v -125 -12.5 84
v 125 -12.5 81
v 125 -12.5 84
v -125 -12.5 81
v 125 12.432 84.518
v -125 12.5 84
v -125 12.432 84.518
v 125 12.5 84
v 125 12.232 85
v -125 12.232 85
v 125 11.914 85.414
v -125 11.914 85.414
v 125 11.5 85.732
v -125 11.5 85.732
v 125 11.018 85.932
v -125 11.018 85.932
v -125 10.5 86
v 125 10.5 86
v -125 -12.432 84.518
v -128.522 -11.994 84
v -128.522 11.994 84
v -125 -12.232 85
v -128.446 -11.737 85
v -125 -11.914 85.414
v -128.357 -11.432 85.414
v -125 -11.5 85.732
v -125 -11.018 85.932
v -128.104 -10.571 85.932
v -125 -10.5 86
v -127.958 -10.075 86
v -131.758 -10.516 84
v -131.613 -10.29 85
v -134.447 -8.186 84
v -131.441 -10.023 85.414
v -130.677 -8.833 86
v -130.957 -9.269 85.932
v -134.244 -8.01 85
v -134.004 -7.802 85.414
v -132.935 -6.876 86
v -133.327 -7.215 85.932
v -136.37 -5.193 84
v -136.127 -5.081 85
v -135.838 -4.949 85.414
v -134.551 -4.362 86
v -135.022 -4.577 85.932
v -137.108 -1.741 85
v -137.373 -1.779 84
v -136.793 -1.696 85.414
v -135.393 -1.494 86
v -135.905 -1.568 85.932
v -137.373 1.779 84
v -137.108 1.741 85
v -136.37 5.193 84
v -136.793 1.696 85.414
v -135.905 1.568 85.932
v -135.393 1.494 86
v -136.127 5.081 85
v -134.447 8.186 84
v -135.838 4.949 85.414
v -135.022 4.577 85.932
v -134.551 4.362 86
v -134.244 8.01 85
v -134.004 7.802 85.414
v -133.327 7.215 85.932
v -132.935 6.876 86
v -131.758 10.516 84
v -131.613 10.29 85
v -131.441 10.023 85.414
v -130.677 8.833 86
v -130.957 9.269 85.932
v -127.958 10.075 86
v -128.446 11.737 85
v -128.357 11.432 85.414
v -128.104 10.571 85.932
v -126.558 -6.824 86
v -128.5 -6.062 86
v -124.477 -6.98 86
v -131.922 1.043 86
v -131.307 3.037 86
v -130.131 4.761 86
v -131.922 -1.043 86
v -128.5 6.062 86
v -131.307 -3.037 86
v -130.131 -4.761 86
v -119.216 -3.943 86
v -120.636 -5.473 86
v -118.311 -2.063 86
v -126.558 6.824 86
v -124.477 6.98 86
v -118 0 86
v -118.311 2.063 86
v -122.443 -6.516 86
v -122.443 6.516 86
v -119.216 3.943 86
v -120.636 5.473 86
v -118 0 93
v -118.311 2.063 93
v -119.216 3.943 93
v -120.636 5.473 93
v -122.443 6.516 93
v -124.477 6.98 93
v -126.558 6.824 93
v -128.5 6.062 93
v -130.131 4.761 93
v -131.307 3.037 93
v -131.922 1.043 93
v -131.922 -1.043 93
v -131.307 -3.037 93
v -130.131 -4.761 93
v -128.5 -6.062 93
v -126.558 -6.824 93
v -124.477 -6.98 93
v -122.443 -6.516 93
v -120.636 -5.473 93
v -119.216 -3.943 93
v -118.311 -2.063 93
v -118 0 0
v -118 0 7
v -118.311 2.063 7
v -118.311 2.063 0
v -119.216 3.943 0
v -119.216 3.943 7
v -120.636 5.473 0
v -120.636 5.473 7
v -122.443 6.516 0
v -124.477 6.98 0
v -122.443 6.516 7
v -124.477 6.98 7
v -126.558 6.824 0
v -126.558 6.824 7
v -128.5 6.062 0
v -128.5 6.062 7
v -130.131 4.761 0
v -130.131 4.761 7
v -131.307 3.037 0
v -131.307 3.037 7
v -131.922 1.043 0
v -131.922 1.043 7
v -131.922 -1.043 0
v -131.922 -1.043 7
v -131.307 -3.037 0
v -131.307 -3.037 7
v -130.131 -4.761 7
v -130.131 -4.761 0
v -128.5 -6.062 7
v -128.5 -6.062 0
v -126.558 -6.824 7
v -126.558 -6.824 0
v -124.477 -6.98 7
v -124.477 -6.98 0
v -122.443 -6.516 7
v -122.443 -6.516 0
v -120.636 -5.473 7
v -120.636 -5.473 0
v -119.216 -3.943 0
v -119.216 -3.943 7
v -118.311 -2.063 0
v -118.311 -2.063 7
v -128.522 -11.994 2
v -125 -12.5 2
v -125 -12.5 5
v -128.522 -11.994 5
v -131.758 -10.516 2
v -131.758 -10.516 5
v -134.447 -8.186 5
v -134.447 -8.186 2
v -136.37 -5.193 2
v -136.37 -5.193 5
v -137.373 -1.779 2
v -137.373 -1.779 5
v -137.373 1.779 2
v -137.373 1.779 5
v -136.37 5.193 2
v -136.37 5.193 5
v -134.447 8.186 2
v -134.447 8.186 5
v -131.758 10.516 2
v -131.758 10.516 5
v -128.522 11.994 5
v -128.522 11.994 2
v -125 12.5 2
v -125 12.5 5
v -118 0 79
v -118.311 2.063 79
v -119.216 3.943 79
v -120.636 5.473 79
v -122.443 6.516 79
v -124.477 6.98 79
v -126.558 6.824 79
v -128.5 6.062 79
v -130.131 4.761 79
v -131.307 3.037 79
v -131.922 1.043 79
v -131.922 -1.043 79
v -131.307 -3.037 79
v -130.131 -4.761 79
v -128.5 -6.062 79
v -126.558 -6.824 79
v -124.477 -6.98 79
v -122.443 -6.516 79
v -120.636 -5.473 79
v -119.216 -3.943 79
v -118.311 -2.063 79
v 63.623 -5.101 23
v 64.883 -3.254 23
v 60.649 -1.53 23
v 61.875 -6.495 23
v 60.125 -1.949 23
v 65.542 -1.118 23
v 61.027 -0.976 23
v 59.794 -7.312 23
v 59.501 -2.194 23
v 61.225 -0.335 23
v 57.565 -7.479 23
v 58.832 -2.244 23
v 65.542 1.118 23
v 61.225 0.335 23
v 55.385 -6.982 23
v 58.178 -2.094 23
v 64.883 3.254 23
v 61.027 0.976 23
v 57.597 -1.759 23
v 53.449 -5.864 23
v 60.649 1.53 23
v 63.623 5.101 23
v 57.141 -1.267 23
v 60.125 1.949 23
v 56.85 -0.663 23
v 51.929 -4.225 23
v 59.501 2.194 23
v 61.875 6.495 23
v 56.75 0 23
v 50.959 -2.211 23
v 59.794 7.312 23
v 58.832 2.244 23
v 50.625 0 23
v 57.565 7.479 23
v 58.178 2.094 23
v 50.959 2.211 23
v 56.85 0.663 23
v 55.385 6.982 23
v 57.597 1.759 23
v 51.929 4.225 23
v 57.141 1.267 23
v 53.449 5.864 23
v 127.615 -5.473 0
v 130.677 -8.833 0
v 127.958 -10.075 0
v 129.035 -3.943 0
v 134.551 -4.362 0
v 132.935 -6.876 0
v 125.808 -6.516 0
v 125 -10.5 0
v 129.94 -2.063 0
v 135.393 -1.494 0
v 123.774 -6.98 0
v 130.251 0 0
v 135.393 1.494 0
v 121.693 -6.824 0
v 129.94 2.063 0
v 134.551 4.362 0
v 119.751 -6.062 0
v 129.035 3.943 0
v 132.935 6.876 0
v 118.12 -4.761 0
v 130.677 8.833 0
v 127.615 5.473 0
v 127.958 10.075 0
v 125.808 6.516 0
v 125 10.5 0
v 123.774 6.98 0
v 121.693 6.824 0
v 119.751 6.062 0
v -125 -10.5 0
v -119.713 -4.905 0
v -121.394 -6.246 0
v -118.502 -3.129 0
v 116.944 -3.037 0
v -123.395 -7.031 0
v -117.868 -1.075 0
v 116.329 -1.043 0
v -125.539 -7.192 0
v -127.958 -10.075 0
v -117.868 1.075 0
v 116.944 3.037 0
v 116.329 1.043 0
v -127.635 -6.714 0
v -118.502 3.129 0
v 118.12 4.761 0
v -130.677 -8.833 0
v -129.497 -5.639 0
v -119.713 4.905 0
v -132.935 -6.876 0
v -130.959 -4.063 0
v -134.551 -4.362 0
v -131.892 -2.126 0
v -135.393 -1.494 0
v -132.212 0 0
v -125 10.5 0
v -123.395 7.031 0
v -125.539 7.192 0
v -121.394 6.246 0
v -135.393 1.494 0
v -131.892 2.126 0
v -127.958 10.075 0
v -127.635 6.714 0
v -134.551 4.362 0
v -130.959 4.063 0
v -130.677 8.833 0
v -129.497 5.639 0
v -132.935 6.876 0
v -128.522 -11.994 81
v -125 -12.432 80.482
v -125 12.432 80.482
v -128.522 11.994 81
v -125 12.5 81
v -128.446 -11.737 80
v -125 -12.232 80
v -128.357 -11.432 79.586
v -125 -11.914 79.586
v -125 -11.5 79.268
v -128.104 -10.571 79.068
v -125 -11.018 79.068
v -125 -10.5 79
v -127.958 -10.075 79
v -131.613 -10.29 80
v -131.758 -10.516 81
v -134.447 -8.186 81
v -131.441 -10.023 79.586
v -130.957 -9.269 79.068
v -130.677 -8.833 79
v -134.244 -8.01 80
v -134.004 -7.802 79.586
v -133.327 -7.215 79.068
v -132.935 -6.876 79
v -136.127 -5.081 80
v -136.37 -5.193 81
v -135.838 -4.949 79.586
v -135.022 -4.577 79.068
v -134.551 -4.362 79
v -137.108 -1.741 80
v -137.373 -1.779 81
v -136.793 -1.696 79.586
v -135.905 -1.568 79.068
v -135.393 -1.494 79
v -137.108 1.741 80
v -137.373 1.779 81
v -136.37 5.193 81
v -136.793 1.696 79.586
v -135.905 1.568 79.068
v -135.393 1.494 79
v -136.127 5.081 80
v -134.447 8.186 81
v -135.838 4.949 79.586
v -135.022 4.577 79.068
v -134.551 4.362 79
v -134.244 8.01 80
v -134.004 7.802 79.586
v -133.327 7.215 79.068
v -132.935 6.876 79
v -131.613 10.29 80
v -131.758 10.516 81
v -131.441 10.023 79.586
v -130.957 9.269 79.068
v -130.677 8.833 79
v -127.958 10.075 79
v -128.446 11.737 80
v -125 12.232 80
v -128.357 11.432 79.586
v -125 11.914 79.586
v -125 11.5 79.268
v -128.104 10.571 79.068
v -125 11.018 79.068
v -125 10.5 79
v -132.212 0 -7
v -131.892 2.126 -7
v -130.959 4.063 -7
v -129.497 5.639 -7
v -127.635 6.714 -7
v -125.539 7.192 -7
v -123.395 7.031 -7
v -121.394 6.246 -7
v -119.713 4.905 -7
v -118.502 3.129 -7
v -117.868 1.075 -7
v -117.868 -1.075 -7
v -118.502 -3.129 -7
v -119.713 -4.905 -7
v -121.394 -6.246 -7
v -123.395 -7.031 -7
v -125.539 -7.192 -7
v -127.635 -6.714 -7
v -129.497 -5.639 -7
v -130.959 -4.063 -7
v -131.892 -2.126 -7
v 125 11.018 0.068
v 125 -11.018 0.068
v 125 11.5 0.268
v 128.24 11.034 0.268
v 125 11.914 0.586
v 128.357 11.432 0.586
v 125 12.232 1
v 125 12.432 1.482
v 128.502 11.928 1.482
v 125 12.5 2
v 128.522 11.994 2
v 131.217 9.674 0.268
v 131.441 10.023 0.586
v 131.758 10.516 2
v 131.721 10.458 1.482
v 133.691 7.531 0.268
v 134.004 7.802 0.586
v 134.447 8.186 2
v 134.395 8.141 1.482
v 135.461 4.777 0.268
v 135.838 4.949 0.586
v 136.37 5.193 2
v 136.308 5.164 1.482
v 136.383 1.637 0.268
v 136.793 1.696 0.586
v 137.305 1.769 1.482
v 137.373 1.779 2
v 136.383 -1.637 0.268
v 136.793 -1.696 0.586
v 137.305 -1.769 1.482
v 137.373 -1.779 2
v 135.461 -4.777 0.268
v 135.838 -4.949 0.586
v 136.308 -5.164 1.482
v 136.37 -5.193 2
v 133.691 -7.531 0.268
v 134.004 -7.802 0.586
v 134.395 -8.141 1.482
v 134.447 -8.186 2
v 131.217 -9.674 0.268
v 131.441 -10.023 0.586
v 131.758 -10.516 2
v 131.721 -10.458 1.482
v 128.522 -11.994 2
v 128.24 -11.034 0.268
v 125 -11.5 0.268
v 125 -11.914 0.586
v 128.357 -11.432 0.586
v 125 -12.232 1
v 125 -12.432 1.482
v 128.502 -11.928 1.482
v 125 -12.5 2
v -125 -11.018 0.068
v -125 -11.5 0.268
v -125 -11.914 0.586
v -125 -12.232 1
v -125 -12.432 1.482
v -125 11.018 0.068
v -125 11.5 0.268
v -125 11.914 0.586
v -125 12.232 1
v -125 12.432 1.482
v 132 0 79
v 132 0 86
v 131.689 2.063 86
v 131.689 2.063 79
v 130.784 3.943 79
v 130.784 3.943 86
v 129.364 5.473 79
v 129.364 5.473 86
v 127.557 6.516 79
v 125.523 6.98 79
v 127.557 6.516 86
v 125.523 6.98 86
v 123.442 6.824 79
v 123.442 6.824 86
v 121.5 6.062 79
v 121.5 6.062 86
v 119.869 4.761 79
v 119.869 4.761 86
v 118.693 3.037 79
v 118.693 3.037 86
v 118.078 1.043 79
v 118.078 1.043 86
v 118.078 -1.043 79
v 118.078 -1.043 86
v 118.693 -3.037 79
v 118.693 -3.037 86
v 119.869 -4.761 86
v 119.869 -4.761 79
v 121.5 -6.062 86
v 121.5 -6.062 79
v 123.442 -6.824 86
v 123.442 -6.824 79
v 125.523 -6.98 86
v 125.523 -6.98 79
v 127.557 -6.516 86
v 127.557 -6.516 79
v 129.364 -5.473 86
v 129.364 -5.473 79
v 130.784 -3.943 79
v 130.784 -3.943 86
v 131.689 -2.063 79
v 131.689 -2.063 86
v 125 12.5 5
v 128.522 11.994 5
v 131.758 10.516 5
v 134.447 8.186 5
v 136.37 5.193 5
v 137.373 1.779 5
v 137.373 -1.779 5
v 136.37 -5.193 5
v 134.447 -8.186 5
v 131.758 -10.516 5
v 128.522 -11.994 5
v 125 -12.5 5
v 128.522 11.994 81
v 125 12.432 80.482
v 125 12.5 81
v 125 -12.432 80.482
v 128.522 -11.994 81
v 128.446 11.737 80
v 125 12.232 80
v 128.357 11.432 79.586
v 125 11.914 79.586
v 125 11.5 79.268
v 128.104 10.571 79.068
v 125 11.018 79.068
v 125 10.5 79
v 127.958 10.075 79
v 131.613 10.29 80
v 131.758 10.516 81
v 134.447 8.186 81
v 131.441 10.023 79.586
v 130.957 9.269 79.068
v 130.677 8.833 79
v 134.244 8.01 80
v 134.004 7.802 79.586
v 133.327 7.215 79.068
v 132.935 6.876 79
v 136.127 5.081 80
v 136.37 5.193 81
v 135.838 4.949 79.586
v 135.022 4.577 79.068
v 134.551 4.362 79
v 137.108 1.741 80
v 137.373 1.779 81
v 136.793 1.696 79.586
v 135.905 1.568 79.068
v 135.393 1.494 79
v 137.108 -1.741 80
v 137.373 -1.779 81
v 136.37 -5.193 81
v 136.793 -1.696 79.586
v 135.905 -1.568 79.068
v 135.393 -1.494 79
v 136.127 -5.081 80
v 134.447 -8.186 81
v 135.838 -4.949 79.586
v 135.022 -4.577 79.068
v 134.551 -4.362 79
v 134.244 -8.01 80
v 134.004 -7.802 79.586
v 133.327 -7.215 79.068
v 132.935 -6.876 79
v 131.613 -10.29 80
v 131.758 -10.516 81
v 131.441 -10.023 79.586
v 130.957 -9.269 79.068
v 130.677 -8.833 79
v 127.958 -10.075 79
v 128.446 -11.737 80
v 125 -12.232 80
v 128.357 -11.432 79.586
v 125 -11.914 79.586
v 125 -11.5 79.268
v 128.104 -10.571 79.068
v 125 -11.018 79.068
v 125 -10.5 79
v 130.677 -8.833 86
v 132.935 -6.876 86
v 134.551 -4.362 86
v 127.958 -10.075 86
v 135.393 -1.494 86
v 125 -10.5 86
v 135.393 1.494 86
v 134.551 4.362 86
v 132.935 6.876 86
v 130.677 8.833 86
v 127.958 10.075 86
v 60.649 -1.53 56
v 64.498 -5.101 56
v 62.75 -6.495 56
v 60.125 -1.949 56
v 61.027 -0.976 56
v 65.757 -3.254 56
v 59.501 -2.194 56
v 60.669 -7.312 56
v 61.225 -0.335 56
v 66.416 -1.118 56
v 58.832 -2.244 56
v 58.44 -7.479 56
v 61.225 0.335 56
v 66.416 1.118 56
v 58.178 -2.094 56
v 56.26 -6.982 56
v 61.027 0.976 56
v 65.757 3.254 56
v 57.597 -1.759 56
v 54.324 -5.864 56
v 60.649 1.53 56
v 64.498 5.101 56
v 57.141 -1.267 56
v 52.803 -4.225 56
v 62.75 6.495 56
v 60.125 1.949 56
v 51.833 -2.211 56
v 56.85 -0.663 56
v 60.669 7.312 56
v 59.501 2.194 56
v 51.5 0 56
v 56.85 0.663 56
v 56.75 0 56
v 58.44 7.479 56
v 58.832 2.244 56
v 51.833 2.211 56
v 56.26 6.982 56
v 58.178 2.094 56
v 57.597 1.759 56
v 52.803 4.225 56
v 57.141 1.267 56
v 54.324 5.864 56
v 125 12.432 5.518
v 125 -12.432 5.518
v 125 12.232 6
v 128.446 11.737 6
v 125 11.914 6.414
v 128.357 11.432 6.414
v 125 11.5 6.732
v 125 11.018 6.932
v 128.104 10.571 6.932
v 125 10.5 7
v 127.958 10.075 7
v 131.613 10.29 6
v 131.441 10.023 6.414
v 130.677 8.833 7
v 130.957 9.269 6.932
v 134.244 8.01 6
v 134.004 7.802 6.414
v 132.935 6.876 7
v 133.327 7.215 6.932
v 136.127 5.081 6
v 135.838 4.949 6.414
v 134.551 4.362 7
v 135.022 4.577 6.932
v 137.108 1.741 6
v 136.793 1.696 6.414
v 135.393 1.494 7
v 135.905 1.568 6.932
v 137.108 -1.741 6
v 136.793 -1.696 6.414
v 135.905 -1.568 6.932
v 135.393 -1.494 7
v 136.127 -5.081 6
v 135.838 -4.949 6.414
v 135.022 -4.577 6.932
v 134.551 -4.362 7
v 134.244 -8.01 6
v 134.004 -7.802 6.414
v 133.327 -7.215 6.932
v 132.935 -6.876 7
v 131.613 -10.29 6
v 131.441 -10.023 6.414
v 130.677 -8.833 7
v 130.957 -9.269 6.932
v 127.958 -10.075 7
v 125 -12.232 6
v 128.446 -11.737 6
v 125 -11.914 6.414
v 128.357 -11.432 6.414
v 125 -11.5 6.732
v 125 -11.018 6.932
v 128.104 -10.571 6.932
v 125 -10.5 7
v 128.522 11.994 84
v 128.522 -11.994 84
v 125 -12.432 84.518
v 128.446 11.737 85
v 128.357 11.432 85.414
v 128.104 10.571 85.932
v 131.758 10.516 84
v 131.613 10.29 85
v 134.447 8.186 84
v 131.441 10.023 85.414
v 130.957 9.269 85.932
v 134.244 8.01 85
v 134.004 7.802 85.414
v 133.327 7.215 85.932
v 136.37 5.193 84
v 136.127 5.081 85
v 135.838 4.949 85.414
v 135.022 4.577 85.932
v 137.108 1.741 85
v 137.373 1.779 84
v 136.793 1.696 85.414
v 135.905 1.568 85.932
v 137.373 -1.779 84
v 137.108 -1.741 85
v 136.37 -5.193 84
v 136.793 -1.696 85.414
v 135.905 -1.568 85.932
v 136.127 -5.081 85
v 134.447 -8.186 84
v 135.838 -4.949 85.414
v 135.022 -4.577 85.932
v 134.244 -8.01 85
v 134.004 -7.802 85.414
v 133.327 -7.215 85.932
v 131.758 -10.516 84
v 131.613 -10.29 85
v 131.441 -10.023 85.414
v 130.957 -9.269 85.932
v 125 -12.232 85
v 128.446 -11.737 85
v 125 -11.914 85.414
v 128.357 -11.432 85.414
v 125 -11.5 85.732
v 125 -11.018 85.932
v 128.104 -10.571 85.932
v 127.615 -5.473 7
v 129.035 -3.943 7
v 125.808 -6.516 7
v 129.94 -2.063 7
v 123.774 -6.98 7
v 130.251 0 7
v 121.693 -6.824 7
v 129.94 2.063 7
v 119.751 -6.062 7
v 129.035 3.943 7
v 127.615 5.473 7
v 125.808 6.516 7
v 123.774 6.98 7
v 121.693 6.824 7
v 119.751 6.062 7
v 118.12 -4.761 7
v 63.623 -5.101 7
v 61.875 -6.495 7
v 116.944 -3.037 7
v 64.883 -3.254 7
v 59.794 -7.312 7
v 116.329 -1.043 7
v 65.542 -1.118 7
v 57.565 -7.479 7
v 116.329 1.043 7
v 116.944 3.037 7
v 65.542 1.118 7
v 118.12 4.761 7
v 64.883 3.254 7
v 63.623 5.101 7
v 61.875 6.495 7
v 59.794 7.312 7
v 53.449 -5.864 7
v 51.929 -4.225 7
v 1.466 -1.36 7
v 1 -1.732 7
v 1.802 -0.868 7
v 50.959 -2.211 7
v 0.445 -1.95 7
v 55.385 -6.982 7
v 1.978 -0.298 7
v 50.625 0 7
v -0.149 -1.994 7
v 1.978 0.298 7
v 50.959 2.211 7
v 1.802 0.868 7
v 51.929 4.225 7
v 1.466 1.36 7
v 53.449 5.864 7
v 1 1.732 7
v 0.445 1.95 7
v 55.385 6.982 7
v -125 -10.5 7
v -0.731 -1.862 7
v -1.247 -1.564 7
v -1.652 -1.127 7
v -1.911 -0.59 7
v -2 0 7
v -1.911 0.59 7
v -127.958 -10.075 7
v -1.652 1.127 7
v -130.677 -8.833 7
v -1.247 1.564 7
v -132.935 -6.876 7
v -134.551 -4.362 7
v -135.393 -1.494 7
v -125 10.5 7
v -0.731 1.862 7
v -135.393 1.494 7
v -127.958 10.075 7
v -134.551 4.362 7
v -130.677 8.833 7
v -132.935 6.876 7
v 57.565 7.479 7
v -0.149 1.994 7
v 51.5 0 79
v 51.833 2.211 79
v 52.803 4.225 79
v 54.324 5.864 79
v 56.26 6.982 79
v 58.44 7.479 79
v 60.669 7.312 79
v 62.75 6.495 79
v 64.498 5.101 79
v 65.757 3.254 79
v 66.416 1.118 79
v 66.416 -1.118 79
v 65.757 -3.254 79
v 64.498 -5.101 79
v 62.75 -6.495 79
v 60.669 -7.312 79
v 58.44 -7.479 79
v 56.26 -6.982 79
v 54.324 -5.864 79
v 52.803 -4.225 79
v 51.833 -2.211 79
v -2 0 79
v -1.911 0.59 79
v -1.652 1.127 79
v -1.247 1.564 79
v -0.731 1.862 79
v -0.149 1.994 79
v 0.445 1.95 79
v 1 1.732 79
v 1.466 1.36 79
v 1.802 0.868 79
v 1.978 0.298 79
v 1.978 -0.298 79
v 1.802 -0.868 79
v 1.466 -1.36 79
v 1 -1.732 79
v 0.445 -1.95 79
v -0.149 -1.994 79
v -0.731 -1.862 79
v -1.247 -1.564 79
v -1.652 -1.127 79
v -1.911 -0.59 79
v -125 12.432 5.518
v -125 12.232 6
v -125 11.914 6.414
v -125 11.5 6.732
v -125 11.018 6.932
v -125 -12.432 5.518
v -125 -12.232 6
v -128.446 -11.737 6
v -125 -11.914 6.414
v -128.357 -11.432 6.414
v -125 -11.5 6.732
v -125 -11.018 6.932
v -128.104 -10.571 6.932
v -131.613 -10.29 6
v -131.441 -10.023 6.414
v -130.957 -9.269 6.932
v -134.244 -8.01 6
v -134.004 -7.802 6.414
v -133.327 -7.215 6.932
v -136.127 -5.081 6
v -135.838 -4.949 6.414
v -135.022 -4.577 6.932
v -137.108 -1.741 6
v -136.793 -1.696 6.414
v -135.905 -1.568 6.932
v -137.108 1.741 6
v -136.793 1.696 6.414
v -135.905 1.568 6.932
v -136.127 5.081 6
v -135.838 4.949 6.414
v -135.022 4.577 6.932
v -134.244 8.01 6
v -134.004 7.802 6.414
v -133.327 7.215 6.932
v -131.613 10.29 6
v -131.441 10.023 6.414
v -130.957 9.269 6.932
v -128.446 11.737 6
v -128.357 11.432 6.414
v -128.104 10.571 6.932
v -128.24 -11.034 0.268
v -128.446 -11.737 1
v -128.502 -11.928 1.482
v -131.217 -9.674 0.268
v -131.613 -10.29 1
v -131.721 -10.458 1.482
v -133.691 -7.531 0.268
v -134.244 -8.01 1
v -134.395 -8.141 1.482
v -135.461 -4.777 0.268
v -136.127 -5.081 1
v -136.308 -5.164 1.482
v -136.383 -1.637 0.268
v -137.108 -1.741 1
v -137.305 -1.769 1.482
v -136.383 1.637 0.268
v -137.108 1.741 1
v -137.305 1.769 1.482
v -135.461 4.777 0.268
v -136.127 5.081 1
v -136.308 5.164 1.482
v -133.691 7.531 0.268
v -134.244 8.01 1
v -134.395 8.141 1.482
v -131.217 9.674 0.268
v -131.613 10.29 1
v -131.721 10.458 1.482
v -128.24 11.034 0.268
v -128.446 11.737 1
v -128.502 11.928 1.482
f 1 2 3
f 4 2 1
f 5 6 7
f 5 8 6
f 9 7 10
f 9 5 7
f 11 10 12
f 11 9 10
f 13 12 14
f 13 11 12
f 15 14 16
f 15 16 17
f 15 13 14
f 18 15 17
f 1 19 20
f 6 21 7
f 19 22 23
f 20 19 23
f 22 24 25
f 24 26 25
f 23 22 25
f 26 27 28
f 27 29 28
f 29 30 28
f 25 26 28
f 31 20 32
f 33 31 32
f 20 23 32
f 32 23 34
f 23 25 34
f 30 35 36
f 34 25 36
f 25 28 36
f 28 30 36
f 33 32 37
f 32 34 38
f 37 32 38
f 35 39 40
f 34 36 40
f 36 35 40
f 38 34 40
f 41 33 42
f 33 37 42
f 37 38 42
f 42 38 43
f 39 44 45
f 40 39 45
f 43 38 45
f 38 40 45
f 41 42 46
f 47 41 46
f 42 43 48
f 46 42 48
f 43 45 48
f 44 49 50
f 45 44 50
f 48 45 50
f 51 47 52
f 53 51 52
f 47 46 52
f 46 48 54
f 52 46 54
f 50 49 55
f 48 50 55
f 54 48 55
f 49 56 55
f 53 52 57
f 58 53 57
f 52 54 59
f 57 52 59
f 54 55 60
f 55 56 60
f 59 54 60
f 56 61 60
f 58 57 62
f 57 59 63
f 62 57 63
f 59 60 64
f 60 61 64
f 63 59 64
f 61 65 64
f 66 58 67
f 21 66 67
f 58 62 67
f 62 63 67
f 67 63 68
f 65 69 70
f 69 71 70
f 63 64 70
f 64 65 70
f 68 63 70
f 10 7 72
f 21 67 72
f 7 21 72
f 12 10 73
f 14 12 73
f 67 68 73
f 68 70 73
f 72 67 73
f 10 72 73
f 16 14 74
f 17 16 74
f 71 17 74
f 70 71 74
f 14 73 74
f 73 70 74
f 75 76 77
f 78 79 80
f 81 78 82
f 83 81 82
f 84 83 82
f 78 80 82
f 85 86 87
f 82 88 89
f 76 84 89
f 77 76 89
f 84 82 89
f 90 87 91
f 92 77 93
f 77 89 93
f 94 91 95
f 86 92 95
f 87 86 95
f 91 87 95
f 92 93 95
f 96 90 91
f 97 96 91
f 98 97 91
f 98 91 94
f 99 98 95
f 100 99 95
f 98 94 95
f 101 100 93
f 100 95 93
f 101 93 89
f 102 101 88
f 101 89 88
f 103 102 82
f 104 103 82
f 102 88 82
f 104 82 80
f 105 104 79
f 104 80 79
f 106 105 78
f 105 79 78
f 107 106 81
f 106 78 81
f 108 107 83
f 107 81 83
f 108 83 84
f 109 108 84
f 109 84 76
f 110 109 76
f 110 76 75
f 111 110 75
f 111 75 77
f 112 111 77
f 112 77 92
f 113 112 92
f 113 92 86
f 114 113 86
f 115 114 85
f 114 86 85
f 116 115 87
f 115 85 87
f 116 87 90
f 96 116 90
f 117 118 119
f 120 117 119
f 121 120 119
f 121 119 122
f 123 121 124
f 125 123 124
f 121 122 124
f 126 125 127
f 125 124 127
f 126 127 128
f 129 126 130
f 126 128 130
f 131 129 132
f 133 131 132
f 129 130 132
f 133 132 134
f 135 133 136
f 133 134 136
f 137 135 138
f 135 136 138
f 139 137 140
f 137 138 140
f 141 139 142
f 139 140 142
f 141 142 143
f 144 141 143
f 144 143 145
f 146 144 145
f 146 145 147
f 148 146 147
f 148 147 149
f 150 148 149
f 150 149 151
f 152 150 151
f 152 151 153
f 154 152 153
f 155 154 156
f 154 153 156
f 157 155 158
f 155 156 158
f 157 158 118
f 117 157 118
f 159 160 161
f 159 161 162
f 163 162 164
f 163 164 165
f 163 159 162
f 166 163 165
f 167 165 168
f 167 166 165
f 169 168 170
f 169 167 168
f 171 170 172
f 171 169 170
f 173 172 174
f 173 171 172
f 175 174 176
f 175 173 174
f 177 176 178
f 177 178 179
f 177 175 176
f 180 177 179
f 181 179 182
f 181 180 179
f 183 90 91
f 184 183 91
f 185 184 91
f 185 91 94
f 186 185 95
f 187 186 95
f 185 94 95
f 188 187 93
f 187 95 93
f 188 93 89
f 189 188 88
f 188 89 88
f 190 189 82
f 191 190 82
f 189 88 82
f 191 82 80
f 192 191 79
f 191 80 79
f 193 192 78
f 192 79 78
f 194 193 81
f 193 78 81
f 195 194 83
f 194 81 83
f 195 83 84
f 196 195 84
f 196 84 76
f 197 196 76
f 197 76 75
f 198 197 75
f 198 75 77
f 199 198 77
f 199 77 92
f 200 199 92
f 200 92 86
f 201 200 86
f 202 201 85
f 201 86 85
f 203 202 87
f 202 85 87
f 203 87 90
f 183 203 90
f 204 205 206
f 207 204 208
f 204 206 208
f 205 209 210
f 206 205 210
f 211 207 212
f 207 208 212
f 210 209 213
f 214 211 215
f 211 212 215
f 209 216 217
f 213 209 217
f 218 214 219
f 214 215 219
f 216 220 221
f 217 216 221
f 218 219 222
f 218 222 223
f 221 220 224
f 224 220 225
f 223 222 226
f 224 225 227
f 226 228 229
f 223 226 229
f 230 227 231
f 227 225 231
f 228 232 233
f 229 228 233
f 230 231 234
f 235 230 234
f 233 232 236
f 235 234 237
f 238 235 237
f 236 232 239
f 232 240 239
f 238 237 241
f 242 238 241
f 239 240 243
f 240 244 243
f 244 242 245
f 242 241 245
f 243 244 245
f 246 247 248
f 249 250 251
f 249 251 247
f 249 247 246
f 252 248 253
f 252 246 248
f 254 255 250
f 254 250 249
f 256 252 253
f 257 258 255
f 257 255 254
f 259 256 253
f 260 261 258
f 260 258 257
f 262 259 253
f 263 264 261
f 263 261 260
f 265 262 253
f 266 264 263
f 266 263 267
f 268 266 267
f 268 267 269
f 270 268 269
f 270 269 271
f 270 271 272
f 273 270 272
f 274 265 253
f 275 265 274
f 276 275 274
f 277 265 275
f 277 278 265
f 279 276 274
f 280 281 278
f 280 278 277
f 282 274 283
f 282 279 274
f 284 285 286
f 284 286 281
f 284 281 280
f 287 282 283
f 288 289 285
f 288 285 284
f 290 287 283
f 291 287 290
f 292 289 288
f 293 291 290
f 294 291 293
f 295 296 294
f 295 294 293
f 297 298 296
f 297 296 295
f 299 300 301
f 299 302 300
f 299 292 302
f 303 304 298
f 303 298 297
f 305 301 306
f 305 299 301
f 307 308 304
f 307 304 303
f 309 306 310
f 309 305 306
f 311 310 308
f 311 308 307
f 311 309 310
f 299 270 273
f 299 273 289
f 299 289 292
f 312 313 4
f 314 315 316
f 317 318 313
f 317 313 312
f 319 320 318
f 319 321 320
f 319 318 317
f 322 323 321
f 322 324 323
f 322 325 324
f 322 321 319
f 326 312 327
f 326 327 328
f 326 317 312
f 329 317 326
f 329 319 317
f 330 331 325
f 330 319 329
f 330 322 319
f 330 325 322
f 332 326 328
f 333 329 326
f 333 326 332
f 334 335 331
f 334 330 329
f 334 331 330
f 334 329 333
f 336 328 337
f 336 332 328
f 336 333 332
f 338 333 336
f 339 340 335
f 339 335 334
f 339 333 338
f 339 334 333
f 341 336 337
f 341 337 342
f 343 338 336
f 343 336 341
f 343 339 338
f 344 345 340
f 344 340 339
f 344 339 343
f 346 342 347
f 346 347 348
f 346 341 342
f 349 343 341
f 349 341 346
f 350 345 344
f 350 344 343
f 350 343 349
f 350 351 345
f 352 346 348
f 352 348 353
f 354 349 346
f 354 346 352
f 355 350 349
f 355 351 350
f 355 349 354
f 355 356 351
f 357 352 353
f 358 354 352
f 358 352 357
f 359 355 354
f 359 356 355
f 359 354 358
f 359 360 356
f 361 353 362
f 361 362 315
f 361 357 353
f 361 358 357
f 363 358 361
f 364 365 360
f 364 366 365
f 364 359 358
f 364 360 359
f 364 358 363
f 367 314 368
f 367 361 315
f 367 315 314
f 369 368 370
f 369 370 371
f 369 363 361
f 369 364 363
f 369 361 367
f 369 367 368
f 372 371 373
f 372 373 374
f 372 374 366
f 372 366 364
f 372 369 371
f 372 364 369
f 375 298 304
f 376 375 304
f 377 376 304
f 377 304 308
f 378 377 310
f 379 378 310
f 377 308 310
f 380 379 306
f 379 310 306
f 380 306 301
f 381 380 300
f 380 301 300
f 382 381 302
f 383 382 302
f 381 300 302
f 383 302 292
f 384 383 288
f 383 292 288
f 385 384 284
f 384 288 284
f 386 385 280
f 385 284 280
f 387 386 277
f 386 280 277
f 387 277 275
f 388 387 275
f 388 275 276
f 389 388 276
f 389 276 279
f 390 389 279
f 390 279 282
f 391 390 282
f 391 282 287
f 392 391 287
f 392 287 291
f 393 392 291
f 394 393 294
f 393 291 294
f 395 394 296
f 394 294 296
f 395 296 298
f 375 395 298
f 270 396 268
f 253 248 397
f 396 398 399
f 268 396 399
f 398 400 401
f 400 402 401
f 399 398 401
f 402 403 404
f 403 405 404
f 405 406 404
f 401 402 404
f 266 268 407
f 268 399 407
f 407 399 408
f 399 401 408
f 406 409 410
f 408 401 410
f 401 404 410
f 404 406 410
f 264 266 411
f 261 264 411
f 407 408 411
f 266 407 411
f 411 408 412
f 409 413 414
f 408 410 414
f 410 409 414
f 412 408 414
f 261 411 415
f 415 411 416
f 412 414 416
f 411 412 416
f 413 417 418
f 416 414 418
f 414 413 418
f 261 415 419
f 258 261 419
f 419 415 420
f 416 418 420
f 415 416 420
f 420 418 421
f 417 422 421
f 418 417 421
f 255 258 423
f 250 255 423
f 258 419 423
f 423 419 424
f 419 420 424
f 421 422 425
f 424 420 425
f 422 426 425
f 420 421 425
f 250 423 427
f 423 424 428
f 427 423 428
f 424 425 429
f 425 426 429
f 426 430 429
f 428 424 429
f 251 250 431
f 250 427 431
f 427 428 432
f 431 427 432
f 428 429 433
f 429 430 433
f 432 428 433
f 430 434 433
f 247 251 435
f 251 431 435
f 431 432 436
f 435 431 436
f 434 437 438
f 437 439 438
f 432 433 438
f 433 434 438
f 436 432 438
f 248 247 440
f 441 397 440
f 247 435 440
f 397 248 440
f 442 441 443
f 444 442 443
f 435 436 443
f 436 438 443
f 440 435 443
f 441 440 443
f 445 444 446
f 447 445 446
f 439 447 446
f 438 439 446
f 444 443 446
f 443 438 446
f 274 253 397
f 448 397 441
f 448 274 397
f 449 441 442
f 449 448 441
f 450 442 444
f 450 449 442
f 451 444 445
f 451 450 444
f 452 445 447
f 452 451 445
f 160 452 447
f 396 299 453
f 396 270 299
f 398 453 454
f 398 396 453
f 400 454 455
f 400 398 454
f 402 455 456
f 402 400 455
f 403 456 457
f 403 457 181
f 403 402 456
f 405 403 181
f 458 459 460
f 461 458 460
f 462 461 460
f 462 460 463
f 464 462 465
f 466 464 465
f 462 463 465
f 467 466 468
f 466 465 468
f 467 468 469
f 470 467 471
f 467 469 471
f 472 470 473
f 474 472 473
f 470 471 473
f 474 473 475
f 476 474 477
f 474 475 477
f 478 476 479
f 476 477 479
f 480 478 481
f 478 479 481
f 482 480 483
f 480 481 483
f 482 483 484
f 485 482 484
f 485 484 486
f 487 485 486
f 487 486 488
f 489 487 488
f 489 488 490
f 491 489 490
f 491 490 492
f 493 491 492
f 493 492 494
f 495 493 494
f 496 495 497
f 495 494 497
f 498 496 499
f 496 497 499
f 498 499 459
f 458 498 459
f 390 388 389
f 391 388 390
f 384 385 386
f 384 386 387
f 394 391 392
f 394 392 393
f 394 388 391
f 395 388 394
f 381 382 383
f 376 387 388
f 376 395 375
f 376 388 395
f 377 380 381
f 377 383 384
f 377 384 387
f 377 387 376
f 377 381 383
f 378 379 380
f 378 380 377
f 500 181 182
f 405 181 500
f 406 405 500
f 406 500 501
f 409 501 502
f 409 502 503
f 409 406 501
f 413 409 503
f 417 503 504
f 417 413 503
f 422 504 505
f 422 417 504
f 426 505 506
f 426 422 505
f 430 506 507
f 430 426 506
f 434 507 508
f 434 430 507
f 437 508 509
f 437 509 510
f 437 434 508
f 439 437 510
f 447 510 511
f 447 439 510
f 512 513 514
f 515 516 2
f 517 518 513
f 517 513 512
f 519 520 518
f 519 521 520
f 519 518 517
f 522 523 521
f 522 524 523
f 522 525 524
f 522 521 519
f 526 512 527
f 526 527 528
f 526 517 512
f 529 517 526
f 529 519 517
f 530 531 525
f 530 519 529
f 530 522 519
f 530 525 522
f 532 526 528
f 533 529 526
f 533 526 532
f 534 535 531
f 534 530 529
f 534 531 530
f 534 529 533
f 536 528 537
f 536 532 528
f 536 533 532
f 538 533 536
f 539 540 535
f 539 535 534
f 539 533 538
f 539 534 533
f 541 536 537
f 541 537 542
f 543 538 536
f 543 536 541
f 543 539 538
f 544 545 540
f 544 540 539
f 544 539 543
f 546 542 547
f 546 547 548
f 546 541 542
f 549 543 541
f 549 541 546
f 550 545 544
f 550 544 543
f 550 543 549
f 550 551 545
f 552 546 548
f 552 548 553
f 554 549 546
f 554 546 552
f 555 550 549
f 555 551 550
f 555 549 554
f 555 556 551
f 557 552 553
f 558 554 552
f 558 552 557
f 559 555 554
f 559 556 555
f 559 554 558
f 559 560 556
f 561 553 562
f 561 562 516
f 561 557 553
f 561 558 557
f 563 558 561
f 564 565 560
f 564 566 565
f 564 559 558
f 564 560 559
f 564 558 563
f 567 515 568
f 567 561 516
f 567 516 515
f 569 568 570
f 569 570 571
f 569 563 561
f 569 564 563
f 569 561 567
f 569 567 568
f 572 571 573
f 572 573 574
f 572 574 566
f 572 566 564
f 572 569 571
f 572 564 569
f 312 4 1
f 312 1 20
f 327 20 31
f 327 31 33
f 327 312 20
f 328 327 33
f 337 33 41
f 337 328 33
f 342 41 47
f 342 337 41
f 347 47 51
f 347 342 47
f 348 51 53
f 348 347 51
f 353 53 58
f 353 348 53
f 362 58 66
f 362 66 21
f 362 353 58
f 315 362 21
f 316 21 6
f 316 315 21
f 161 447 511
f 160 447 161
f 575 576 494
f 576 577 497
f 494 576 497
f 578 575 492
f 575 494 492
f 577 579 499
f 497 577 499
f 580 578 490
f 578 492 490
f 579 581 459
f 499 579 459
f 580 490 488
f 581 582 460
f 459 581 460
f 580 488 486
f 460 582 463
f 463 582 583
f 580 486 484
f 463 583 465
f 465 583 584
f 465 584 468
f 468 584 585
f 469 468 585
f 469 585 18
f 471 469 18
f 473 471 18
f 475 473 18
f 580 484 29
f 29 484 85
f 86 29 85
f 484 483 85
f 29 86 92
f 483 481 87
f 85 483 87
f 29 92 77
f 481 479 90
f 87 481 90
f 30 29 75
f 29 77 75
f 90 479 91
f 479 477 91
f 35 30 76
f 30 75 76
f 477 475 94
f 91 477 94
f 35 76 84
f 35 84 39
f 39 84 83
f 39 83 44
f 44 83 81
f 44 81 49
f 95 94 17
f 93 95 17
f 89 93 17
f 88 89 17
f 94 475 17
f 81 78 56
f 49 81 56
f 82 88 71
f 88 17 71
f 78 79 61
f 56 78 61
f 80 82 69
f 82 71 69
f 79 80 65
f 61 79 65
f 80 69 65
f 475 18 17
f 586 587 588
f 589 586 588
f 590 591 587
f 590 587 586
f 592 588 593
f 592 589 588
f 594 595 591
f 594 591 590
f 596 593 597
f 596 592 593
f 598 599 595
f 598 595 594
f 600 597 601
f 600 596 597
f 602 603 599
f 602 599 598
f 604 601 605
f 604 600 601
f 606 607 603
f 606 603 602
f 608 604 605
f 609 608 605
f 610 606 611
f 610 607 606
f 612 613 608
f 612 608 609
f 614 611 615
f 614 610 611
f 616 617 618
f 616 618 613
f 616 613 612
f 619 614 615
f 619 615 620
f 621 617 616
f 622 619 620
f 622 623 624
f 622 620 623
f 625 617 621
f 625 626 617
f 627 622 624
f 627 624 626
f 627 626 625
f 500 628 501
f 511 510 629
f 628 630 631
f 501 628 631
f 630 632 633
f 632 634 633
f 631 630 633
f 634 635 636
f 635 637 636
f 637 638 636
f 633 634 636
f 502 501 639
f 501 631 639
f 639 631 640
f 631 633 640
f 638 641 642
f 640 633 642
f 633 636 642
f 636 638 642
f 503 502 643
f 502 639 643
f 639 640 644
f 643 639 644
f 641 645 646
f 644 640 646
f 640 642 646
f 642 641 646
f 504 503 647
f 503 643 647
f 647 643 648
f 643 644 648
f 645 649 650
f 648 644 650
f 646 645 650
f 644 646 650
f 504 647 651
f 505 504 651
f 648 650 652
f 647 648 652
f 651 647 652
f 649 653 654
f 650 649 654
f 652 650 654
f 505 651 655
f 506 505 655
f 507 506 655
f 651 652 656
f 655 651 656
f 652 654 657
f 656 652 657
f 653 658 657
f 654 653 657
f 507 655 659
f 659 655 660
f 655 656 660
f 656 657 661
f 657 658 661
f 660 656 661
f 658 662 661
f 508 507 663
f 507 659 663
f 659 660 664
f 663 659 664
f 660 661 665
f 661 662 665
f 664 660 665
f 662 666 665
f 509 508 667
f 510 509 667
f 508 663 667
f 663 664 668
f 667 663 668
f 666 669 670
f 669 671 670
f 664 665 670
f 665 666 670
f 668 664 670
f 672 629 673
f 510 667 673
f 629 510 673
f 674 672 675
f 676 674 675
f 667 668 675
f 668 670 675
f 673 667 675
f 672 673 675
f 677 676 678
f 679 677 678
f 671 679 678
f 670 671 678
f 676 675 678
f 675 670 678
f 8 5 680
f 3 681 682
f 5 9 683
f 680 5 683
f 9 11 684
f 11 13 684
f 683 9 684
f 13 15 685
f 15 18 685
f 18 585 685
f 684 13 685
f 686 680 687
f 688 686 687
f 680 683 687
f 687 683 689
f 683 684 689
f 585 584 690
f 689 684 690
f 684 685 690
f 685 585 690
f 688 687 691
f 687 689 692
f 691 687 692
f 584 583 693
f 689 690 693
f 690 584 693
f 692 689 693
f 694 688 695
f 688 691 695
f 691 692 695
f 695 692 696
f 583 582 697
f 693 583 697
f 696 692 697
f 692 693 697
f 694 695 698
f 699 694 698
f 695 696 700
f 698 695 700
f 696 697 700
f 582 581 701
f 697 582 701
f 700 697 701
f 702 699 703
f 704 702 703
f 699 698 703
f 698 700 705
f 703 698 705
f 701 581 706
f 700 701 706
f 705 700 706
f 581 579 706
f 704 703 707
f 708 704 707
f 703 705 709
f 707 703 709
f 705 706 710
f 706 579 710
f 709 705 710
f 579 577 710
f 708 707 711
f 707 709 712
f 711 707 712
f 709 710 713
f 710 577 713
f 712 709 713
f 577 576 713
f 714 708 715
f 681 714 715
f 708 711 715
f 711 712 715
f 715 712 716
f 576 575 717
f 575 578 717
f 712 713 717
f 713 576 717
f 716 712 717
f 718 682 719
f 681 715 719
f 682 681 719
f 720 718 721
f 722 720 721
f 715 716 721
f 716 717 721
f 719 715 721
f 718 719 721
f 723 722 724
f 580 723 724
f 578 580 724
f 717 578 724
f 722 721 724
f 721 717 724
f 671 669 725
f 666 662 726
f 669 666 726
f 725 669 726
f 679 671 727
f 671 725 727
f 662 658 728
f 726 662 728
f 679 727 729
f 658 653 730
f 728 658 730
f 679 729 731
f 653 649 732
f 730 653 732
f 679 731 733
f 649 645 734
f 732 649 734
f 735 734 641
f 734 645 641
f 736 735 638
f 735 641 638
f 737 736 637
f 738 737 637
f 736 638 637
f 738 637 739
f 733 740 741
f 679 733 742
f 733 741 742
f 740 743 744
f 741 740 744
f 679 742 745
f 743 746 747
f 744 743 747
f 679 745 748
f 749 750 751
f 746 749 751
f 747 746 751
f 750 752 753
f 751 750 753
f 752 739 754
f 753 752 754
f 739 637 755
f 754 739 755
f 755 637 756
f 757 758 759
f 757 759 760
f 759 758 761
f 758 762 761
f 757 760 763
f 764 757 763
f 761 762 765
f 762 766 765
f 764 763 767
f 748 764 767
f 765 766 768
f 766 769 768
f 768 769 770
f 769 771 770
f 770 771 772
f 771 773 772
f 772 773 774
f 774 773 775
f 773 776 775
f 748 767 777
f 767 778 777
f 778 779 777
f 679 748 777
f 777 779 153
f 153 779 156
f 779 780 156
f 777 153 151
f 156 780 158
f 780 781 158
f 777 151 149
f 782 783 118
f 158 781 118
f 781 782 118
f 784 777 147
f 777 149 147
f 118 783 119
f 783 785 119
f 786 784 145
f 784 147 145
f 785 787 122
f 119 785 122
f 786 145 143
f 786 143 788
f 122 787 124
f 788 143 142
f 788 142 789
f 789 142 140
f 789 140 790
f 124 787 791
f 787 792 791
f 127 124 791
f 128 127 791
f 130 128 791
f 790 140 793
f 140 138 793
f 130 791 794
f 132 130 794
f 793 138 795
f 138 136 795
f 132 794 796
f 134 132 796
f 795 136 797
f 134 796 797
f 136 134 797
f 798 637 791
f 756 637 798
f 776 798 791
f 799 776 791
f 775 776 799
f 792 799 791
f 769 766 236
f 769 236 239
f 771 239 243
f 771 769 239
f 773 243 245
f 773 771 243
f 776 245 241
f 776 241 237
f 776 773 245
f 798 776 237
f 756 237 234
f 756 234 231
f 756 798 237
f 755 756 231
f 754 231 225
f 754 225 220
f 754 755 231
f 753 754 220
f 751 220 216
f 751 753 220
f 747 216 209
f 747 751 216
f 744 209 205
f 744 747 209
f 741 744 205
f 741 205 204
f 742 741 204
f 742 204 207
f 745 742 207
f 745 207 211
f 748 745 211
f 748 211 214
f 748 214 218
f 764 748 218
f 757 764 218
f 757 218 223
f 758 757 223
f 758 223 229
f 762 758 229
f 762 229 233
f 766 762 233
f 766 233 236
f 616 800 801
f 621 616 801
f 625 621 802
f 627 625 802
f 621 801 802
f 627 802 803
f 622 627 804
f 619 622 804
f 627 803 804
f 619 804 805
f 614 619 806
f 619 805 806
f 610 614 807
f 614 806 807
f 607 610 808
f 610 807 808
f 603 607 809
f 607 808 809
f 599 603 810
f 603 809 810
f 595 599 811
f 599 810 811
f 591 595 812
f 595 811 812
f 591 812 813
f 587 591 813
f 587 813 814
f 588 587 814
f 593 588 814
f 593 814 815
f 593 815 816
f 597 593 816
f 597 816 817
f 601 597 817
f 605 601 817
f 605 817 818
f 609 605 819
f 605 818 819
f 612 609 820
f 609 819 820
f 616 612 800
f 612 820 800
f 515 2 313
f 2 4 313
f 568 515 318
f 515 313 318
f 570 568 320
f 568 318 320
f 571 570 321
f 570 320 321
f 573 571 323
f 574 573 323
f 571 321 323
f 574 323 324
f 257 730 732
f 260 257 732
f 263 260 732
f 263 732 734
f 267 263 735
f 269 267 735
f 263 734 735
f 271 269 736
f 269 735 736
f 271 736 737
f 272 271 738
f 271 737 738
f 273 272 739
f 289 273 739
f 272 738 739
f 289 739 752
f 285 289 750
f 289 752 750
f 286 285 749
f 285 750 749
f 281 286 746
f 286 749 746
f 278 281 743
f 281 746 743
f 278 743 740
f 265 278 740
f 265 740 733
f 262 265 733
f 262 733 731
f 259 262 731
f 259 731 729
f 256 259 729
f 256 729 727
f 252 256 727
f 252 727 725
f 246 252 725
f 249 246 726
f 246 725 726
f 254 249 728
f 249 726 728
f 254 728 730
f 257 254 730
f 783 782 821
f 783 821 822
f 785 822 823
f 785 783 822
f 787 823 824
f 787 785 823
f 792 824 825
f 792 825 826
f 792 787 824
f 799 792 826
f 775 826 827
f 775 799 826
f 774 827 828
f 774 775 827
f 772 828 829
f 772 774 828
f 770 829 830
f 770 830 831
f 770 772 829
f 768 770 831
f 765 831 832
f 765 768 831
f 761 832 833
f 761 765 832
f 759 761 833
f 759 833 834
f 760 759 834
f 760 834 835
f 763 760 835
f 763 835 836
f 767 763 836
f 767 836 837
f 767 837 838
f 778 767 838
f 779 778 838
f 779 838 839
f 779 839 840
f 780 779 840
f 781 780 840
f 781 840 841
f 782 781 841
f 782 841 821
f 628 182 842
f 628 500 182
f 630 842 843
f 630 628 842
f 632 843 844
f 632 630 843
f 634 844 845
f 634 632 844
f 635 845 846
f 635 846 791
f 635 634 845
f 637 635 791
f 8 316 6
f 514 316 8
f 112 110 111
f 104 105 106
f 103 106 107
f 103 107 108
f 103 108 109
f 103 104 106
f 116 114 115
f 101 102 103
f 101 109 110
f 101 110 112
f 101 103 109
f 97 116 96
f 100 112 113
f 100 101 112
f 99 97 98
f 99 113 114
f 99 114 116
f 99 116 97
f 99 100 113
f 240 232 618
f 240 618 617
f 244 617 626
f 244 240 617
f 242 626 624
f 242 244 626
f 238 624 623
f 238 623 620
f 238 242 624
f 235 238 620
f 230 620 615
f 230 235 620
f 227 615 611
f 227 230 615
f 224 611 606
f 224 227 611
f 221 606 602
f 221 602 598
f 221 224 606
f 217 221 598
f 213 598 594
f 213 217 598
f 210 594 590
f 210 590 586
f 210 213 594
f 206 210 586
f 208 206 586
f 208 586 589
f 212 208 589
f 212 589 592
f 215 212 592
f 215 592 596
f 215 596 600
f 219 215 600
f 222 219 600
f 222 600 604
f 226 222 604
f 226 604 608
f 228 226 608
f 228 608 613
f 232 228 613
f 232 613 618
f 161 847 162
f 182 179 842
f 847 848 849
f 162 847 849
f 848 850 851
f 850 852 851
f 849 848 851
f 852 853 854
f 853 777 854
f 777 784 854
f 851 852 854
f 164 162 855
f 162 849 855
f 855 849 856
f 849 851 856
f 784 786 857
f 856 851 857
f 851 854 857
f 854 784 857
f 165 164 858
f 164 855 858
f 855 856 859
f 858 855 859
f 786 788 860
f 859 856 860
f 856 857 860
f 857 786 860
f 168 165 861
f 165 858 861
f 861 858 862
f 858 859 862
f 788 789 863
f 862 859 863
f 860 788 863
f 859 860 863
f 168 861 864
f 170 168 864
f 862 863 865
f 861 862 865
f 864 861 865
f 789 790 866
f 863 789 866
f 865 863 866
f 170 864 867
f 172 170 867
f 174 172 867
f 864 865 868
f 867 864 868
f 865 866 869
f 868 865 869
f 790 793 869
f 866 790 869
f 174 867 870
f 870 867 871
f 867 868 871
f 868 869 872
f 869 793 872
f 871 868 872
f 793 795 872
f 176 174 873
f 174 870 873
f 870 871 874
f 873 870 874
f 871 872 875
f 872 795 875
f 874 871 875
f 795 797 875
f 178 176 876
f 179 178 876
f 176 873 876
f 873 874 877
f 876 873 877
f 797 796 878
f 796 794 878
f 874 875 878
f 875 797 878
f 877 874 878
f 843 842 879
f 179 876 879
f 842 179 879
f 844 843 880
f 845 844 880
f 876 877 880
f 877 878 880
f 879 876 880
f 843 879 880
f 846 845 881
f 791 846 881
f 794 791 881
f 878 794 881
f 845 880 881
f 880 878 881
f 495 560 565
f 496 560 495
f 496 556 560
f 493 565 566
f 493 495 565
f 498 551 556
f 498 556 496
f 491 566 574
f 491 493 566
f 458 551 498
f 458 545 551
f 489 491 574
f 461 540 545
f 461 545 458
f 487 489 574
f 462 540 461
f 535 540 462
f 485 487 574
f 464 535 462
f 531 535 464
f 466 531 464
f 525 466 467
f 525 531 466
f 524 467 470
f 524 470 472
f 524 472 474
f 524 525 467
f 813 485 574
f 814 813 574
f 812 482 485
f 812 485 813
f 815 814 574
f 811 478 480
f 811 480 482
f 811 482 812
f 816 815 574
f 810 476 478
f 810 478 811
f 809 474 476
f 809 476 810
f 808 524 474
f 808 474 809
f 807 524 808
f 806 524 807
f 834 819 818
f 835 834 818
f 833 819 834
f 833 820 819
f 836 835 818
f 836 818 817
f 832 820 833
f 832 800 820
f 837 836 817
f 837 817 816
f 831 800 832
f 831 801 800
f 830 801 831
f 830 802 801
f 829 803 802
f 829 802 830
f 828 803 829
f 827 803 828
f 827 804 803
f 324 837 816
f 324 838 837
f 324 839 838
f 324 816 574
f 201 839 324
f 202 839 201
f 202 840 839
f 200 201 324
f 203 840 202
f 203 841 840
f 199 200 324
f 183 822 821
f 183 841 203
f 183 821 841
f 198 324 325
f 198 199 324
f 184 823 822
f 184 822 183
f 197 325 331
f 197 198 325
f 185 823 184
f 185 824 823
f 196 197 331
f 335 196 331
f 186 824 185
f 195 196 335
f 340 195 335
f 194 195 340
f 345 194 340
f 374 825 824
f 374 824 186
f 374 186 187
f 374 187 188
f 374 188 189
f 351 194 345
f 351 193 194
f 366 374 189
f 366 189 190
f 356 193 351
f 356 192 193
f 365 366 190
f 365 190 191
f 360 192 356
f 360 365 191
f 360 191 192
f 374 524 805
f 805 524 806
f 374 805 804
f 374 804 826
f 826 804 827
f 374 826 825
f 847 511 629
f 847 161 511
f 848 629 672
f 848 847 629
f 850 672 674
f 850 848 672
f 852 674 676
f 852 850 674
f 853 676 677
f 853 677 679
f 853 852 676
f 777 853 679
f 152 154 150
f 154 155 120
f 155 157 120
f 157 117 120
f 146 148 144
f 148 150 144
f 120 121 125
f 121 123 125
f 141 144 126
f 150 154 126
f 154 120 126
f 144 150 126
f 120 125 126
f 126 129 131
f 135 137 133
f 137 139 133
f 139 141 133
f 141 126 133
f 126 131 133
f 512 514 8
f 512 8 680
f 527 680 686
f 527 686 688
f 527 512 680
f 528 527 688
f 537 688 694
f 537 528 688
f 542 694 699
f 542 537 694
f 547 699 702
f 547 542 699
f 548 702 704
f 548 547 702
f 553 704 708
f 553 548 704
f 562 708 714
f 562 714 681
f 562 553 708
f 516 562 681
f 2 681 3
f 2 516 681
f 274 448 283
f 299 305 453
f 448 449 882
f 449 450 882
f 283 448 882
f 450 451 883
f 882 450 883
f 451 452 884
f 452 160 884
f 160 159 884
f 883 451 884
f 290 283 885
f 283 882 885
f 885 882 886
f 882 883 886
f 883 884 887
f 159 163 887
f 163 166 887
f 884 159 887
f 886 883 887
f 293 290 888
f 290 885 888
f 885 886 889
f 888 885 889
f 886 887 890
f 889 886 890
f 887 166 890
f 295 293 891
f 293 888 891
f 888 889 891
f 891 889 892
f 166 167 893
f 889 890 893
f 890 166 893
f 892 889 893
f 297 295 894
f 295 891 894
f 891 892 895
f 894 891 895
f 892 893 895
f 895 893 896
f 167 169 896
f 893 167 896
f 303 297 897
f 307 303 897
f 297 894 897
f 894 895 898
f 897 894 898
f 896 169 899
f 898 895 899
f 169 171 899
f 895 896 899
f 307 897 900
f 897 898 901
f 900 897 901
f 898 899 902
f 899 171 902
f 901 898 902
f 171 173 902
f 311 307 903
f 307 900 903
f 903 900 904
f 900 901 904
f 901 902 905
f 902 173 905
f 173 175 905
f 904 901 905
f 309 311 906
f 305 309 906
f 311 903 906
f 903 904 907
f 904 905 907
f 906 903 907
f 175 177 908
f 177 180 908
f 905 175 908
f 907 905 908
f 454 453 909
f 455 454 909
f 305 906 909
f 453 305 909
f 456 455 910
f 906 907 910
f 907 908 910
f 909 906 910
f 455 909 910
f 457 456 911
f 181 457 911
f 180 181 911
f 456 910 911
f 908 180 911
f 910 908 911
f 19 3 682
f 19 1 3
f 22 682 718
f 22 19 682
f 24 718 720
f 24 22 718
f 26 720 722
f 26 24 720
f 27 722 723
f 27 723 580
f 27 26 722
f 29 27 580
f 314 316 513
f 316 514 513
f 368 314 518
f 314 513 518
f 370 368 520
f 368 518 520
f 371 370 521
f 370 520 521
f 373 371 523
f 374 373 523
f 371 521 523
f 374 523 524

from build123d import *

# Parameters (mm, degrees)
BOSS_EXTRUDE1_DEPTH = 7
SKETCH2_R           = 7
CUT_EXTRUDE1_DEPTH  = 7
SKETCH3_R           = 7
CUT_EXTRUDE2_DEPTH  = 7
BOSS_EXTRUDE2_DEPTH = 7
SKETCH5_R           = 7
CUT_EXTRUDE3_DEPTH  = 7
SKETCH6_R           = 7
BOSS_EXTRUDE3_DEPTH = 7
SKETCH8_R           = 7.21207686
BOSS_EXTRUDE4_DEPTH = 7
FILLET1_R           = 2
FILLET2_R           = 2
SKETCH9_R           = 2
BOSS_EXTRUDE5_DEPTH = 82
SKETCH10_R          = 2.25
BOSS_EXTRUDE6_DEPTH = 82
SKETCH11_R          = 7.5
BOSS_EXTRUDE7_DEPTH = 23
SKETCH12_R          = 7.5
BOSS_EXTRUDE8_DEPTH = 23


with BuildPart() as part:
    # Sketch1 → Boss-Extrude1 (new body)
    with BuildSketch(Plane.XY):
        with BuildLine():
            Line((-125, 12.5), (125, 12.5))
            ThreePointArc((125, 12.5), (137.5, 0), (125, -12.5))
            Line((125, -12.5), (-125, -12.5))
            ThreePointArc((-125, -12.5), (-137.5, 0), (-125, 12.5))
        make_face()
    extrude(amount=BOSS_EXTRUDE1_DEPTH)

    # Sketch2 → Cut-Extrude1 (cut)
    with BuildSketch(Plane.XY.offset(7)):
        with Locations((-125, 0)):
            Circle(SKETCH2_R)
    extrude(amount=-CUT_EXTRUDE1_DEPTH, mode=Mode.SUBTRACT)

    # Sketch3 → Cut-Extrude2 (cut)
    with BuildSketch(Plane.XY.offset(7)):
        with Locations((123.250988895, 0)):
            Circle(SKETCH3_R)
    extrude(amount=-CUT_EXTRUDE2_DEPTH, mode=Mode.SUBTRACT)

    # Sketch8 → Boss-Extrude4 (add)
    with BuildSketch(Plane(origin=(0, 0, 0), x_dir=(-1, 0, 0), z_dir=(0, 0, -1))):
        with Locations((125, 0)):
            Circle(SKETCH8_R)
    extrude(amount=BOSS_EXTRUDE4_DEPTH)

    # Fillet2
    fillet2_edges = [part.edges().sort_by_distance(p)[0] for p in [
        (137.5, 0, 7),
        (0, 12.5, 7),
        (-137.5, 0, 7),
        (0, 12.5, 0),
        (137.5, 0, 0),
        (0, -12.5, 0),
        (-137.5, 0, 0),
        (0, -12.5, 7),
    ]]
    fillet(fillet2_edges, radius=FILLET2_R)



with BuildPart() as body_2:
    # Sketch4 → Boss-Extrude2 (new body)
    with BuildSketch(Plane.XY.offset(79)):
        with BuildLine():
            Line((125, -12.5), (-125, -12.5))
            ThreePointArc((-125, -12.5), (-137.5, 0), (-125, 12.5))
            Line((-125, 12.5), (125, 12.5))
            ThreePointArc((125, 12.5), (137.5, 0), (125, -12.5))
        make_face()
    extrude(amount=BOSS_EXTRUDE2_DEPTH)

    # Sketch5 → Cut-Extrude3 (cut)
    with BuildSketch(Plane.XY.offset(86)):
        with Locations((125, 0)):
            Circle(SKETCH5_R)
        with Locations((-125, 0)):
            Circle(SKETCH5_R)
    extrude(amount=-CUT_EXTRUDE3_DEPTH, mode=Mode.SUBTRACT)

    # Fillet1
    fillet1_edges = [body_2.edges().sort_by_distance(p)[0] for p in [
        (-137.5, 0, 86),
        (0, -12.5, 86),
        (137.5, 0, 86),
        (0, -12.5, 79),
        (-137.5, 0, 79),
        (0, 12.5, 79),
        (137.5, 0, 79),
        (0, 12.5, 86),
    ]]
    fillet(fillet1_edges, radius=FILLET1_R)


with BuildPart() as body_3:
    # Sketch6 → Boss-Extrude3 (new body)
    with BuildSketch(Plane.XY.offset(86)):
        with Locations((-125, 0)):
            Circle(SKETCH6_R)
    extrude(amount=BOSS_EXTRUDE3_DEPTH)


with BuildPart() as part_1:
    add(part.part)

    add(body_2.part)  # Boss-Extrude5 merges body 2
    # Sketch9 → Boss-Extrude5 (add)
    with BuildSketch(Plane(origin=(0, 0, 0), x_dir=(-1, 0, 0), z_dir=(0, 0, -1))):
        Circle(SKETCH9_R)
    extrude(amount=-BOSS_EXTRUDE5_DEPTH)

    # Sketch10 → Boss-Extrude6 (add)
    with BuildSketch(Plane(origin=(0, 0, 0), x_dir=(-1, 0, 0), z_dir=(0, 0, -1))):
        with Locations((-59, 0)):
            Circle(SKETCH10_R)
    extrude(amount=-BOSS_EXTRUDE6_DEPTH)

    # Sketch11 → Boss-Extrude7 (add)
    with BuildSketch(Plane(origin=(0, 0, 0), x_dir=(-1, 0, 0), z_dir=(0, 0, -1))):
        with Locations((-58.125494447, 0)):
            Circle(SKETCH11_R)
    extrude(amount=-BOSS_EXTRUDE7_DEPTH)

    # Sketch12 → Boss-Extrude8 (add)
    with BuildSketch(Plane(origin=(0, 0, 79), x_dir=(-1, 0, 0), z_dir=(0, 0, -1))):
        with Locations((-59, 0)):
            Circle(SKETCH12_R)
    extrude(amount=BOSS_EXTRUDE8_DEPTH)


solid = Compound([body_3.part, part_1.part])
